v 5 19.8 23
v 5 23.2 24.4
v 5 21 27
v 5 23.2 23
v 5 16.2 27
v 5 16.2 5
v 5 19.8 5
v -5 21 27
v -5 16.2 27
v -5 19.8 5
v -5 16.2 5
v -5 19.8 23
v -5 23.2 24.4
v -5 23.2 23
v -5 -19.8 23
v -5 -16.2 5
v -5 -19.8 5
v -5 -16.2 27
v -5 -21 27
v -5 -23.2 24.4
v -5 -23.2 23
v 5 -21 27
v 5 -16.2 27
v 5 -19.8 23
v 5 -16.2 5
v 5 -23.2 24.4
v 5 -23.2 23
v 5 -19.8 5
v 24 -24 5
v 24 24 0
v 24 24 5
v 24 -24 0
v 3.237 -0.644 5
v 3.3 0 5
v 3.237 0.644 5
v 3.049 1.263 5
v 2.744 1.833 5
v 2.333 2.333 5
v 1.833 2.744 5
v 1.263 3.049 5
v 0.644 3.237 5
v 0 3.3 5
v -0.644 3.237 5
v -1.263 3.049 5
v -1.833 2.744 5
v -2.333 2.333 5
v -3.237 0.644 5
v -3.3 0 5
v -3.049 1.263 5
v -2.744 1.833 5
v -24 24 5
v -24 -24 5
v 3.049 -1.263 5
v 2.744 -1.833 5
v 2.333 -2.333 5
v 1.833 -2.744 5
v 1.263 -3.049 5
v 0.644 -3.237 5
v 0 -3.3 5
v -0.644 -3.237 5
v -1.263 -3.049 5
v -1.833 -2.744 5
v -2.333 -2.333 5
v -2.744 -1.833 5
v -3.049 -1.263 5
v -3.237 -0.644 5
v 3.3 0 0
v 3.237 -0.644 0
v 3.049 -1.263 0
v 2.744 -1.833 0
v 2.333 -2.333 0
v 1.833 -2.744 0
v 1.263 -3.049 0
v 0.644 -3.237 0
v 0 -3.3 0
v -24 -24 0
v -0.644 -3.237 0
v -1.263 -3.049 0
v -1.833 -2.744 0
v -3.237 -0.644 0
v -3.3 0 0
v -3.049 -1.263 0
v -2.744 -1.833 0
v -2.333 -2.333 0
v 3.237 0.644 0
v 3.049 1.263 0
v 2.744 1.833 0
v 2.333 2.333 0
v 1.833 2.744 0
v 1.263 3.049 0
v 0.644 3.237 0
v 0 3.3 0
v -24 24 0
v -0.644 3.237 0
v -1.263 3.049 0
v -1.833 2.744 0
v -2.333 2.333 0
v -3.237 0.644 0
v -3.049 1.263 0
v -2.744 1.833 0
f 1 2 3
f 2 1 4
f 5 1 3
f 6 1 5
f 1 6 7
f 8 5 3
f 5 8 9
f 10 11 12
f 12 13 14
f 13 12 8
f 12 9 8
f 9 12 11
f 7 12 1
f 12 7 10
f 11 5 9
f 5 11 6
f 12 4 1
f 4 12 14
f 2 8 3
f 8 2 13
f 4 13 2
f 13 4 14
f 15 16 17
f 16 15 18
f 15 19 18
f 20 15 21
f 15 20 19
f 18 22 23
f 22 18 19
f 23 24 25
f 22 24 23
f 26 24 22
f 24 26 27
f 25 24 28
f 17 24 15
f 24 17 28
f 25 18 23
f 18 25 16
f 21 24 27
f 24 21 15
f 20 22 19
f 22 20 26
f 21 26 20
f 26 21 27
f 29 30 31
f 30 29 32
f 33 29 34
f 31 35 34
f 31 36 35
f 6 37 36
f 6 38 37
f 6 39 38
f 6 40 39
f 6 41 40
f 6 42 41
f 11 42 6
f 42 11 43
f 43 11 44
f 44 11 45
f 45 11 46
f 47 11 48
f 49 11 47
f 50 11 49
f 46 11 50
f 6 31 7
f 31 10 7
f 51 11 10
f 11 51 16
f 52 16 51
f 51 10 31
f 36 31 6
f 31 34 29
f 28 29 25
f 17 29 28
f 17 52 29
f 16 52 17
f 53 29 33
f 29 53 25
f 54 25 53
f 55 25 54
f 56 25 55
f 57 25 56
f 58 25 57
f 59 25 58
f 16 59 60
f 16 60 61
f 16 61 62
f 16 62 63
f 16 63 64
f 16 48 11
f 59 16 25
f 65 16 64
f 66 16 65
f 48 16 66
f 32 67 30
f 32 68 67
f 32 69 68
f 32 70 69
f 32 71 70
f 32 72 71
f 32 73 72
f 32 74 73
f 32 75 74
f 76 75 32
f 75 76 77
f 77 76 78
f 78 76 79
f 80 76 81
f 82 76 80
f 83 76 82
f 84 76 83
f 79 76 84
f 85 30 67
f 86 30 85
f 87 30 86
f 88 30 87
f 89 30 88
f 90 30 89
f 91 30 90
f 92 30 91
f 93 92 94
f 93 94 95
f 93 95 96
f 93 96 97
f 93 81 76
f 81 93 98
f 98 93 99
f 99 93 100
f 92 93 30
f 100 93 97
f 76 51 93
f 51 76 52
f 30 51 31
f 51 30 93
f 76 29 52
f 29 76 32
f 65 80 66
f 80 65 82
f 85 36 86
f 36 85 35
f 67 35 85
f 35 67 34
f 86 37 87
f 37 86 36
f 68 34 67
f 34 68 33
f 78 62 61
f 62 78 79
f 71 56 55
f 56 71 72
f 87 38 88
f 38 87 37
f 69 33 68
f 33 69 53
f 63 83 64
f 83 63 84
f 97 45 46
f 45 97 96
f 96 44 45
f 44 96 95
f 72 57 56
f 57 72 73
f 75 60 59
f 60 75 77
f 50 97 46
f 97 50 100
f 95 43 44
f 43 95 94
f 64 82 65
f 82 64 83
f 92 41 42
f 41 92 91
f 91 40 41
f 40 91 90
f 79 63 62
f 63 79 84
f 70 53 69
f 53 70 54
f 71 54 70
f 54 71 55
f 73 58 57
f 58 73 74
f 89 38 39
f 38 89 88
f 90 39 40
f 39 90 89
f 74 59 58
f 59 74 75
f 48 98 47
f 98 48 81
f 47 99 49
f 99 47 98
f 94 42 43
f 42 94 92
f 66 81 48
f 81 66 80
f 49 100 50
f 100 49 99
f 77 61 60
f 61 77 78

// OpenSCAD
$fn = 32;

// ----------------------------------------------------------------------
// Snap-fit latch: 2 arms, 22 mm tall, 3.6 mm undercut hooks
// ----------------------------------------------------------------------

// --- parameters (mm) ---
base_d = 48;              // base plate depth
base_h = 5;               // base plate thickness
span = 36;                // distance between opposite arms
arm_t = 3.6;              // arm thickness
arm_d = 10;               // arm width
height = 22;              // free arm length
head_len = 3.6;           // hook reach
head_h = 4;               // hook height
lead = 1.4;               // lead-in ramp thickness
bore_d = 6.6;             // base fixing bore
top_z = 27;               // height of the arm tips above the base

arms = 2;

difference() {
  union() {
    /* base plate, centred on the arm ring */
    translate([-24, -24, 0]) cube([base_d, base_d, base_h]);
    for (a = [0 : 360 / arms : 359]) rotate([0, 0, a]) {
    /* arm, sunk 0.5 mm into the base */
    translate([-arm_d / 2, span / 2 - arm_t / 2, base_h - 0.5]) cube([arm_d, arm_t, height + 0.5]);
    /* hook: a convex hull of a tall inner block and a thin outer lip
       gives a flat undercut below and a lead-in ramp on top */
    hull() {
      translate([-arm_d / 2, span / 2 + arm_t / 2 - 0.6, top_z - head_h]) cube([arm_d, lead + 0.4, head_h]);
      translate([-arm_d / 2, span / 2 + arm_t / 2 - 0.2, top_z - head_h]) cube([arm_d, head_len, lead]);
    }
    }
  }
  translate([0, 0, -2.5]) cylinder(h = base_h + 5, d = bore_d);
}
